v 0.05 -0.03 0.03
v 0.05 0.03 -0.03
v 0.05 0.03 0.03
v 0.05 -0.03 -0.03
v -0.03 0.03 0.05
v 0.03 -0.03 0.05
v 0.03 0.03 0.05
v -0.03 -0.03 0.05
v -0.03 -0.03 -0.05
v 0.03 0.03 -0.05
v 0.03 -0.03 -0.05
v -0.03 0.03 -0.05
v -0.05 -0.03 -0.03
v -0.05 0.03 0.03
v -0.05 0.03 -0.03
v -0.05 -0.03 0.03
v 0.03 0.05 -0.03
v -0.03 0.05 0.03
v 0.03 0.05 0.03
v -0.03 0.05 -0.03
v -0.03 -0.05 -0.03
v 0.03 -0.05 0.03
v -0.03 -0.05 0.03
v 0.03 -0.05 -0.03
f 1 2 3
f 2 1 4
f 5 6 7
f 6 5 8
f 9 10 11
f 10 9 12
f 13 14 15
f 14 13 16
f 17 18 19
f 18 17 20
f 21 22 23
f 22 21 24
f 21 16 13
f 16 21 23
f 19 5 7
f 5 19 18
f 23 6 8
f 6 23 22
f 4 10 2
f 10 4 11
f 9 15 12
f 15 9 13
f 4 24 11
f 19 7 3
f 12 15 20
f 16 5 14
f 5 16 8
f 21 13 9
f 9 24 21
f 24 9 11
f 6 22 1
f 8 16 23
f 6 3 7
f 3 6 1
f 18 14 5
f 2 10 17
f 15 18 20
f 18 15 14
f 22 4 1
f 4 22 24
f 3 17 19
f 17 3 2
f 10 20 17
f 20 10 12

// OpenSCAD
$fn=64;

size = 0.1;
chamfer = 0.02;

module chamfered_cube(s=0.1, c=0.02) {
    c2 = min(c, s/2);
    intersection() {
        cube([s,s,s], center=true);
        minkowski() {
            cube([s-2*c2, s-2*c2, s-2*c2], center=true);
            octahedron(c2);
        }
    }
}

module octahedron(r=1) {
    polyhedron(
        points=[
            [ r, 0, 0],
            [-r, 0, 0],
            [ 0, r, 0],
            [ 0,-r, 0],
            [ 0, 0, r],
            [ 0, 0,-r]
        ],
        faces=[
            [0,2,4],
            [2,1,4],
            [1,3,4],
            [3,0,4],
            [2,0,5],
            [1,2,5],
            [3,1,5],
            [0,3,5]
        ]
    );
}

chamfered_cube(size, chamfer);
